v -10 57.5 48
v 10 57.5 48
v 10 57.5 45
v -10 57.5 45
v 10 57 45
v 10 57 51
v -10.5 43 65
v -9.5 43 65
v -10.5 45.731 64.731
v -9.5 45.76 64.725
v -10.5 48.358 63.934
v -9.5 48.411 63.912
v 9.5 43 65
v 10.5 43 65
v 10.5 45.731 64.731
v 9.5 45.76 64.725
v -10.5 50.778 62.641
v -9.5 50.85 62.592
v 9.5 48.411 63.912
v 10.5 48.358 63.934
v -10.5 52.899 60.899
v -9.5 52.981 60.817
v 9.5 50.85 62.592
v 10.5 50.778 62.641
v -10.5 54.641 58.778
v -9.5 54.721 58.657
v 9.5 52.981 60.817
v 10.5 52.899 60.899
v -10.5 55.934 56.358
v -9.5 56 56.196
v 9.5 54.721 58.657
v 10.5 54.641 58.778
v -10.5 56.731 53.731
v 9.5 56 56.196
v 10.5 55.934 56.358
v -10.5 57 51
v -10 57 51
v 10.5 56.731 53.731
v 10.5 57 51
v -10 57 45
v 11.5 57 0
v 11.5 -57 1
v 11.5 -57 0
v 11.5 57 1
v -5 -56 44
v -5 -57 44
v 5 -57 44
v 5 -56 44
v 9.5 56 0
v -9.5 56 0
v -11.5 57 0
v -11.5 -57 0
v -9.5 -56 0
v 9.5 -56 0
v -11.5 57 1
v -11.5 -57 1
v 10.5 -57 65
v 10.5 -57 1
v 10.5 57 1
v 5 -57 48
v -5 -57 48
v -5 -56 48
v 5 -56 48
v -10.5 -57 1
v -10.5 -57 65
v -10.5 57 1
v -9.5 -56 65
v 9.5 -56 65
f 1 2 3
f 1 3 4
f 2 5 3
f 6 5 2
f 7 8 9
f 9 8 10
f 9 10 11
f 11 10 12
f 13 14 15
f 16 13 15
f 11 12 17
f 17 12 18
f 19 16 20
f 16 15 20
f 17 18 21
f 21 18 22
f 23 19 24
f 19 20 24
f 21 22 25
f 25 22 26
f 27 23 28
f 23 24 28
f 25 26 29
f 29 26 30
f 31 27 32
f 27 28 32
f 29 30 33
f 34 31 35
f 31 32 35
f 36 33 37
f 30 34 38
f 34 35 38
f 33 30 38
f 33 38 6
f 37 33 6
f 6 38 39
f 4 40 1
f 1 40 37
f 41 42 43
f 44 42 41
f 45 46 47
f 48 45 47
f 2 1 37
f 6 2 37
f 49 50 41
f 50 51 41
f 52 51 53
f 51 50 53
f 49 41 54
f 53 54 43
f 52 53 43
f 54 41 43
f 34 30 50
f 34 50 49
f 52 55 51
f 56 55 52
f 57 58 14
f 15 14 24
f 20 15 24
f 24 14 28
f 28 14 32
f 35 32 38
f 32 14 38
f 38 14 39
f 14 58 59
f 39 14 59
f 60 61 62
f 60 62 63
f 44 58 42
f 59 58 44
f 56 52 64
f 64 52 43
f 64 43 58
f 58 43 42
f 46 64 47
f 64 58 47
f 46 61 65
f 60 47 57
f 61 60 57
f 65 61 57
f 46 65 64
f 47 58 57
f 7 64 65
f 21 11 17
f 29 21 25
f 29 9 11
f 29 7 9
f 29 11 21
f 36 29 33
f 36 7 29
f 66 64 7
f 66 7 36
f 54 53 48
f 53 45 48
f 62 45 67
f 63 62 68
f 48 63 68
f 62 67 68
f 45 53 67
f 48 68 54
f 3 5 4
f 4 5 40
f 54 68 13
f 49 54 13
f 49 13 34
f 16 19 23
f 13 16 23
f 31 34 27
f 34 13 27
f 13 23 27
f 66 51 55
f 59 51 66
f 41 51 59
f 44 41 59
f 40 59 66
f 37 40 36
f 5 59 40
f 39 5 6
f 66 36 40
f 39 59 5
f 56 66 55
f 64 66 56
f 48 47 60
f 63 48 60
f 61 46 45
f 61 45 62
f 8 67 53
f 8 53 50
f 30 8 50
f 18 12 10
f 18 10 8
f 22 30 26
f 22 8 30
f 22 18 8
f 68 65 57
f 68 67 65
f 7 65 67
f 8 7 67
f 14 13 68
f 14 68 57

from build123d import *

# Parameters (mm, degrees)
F0_W      = 21
F0_H      = 114
F1_DEPTH  = 65
F2_W      = 19
F2_H      = 112
F3_DEPTH  = 90
F4_W      = 10
F4_H      = 4
F5_DEPTH  = 25
F6_W      = 114
F6_H      = 1
F7_DEPTH  = 1
F8_W      = 114
F8_H      = 1
F9_DEPTH  = 1
F11_DEPTH = 25
F12_W     = 20
F12_H     = 6
F13_DEPTH = 0.5
F15_DEPTH = 25


with BuildPart() as f1:
    # F0 (on Top) → F1 (new body)
    with BuildSketch(Plane.XY):
        Rectangle(F0_W, F0_H)
    extrude(amount=F1_DEPTH)

    # F2 (on face) → F3 (cut)
    with BuildSketch(Plane.XY.offset(65)):
        Rectangle(F2_W, F2_H)
    extrude(amount=-F3_DEPTH, mode=Mode.SUBTRACT)

    # F4 (on face) → F5 (cut)
    with BuildSketch(Plane.XZ.offset(57)):
        with Locations((0, 46)):
            Rectangle(F4_W, F4_H)
    extrude(amount=-F5_DEPTH, mode=Mode.SUBTRACT)

    # F6 (on face) → F7 (join)
    with BuildSketch(Plane.YZ.offset(10.5)):
        with Locations((0, 0.5)):
            Rectangle(F6_W, F6_H)
    extrude(amount=F7_DEPTH)

    # F8 (on face) → F9 (join)
    with BuildSketch(Plane(origin=(-10.5, 0, 0), x_dir=(0, -1, 0), z_dir=(-1, 0, 0))):
        with Locations((0, 0.5)):
            Rectangle(F8_W, F8_H)
    extrude(amount=F9_DEPTH)

    # F10 (on face) → F11 (cut)
    with BuildSketch(Plane.YZ.offset(10.5)):
        with BuildLine():
            ThreePointArc((43, 65), (52.899495, 60.899495), (57, 51))
            Line((57, 51), (57, 65))
            Line((57, 65), (43, 65))
        make_face()
    extrude(amount=-F11_DEPTH, mode=Mode.SUBTRACT)

    # F12 (on face) → F13 (join)
    with BuildSketch(Plane(origin=(0, 57, 0), x_dir=(-1, 0, 0), z_dir=(0, 1, 0))):
        with Locations((0, 48)):
            Rectangle(F12_W, F12_H)
    extrude(amount=F13_DEPTH)

    # F14 (on face) → F15 (cut)
    with BuildSketch(Plane(origin=(-10, 0, 0), x_dir=(0, -1, 0), z_dir=(-1, 0, 0))):
        Polygon((-57.5, 51), (-57.5, 48), (-57, 51), align=None)
    extrude(amount=-F15_DEPTH, mode=Mode.SUBTRACT)


solid = f1.part
